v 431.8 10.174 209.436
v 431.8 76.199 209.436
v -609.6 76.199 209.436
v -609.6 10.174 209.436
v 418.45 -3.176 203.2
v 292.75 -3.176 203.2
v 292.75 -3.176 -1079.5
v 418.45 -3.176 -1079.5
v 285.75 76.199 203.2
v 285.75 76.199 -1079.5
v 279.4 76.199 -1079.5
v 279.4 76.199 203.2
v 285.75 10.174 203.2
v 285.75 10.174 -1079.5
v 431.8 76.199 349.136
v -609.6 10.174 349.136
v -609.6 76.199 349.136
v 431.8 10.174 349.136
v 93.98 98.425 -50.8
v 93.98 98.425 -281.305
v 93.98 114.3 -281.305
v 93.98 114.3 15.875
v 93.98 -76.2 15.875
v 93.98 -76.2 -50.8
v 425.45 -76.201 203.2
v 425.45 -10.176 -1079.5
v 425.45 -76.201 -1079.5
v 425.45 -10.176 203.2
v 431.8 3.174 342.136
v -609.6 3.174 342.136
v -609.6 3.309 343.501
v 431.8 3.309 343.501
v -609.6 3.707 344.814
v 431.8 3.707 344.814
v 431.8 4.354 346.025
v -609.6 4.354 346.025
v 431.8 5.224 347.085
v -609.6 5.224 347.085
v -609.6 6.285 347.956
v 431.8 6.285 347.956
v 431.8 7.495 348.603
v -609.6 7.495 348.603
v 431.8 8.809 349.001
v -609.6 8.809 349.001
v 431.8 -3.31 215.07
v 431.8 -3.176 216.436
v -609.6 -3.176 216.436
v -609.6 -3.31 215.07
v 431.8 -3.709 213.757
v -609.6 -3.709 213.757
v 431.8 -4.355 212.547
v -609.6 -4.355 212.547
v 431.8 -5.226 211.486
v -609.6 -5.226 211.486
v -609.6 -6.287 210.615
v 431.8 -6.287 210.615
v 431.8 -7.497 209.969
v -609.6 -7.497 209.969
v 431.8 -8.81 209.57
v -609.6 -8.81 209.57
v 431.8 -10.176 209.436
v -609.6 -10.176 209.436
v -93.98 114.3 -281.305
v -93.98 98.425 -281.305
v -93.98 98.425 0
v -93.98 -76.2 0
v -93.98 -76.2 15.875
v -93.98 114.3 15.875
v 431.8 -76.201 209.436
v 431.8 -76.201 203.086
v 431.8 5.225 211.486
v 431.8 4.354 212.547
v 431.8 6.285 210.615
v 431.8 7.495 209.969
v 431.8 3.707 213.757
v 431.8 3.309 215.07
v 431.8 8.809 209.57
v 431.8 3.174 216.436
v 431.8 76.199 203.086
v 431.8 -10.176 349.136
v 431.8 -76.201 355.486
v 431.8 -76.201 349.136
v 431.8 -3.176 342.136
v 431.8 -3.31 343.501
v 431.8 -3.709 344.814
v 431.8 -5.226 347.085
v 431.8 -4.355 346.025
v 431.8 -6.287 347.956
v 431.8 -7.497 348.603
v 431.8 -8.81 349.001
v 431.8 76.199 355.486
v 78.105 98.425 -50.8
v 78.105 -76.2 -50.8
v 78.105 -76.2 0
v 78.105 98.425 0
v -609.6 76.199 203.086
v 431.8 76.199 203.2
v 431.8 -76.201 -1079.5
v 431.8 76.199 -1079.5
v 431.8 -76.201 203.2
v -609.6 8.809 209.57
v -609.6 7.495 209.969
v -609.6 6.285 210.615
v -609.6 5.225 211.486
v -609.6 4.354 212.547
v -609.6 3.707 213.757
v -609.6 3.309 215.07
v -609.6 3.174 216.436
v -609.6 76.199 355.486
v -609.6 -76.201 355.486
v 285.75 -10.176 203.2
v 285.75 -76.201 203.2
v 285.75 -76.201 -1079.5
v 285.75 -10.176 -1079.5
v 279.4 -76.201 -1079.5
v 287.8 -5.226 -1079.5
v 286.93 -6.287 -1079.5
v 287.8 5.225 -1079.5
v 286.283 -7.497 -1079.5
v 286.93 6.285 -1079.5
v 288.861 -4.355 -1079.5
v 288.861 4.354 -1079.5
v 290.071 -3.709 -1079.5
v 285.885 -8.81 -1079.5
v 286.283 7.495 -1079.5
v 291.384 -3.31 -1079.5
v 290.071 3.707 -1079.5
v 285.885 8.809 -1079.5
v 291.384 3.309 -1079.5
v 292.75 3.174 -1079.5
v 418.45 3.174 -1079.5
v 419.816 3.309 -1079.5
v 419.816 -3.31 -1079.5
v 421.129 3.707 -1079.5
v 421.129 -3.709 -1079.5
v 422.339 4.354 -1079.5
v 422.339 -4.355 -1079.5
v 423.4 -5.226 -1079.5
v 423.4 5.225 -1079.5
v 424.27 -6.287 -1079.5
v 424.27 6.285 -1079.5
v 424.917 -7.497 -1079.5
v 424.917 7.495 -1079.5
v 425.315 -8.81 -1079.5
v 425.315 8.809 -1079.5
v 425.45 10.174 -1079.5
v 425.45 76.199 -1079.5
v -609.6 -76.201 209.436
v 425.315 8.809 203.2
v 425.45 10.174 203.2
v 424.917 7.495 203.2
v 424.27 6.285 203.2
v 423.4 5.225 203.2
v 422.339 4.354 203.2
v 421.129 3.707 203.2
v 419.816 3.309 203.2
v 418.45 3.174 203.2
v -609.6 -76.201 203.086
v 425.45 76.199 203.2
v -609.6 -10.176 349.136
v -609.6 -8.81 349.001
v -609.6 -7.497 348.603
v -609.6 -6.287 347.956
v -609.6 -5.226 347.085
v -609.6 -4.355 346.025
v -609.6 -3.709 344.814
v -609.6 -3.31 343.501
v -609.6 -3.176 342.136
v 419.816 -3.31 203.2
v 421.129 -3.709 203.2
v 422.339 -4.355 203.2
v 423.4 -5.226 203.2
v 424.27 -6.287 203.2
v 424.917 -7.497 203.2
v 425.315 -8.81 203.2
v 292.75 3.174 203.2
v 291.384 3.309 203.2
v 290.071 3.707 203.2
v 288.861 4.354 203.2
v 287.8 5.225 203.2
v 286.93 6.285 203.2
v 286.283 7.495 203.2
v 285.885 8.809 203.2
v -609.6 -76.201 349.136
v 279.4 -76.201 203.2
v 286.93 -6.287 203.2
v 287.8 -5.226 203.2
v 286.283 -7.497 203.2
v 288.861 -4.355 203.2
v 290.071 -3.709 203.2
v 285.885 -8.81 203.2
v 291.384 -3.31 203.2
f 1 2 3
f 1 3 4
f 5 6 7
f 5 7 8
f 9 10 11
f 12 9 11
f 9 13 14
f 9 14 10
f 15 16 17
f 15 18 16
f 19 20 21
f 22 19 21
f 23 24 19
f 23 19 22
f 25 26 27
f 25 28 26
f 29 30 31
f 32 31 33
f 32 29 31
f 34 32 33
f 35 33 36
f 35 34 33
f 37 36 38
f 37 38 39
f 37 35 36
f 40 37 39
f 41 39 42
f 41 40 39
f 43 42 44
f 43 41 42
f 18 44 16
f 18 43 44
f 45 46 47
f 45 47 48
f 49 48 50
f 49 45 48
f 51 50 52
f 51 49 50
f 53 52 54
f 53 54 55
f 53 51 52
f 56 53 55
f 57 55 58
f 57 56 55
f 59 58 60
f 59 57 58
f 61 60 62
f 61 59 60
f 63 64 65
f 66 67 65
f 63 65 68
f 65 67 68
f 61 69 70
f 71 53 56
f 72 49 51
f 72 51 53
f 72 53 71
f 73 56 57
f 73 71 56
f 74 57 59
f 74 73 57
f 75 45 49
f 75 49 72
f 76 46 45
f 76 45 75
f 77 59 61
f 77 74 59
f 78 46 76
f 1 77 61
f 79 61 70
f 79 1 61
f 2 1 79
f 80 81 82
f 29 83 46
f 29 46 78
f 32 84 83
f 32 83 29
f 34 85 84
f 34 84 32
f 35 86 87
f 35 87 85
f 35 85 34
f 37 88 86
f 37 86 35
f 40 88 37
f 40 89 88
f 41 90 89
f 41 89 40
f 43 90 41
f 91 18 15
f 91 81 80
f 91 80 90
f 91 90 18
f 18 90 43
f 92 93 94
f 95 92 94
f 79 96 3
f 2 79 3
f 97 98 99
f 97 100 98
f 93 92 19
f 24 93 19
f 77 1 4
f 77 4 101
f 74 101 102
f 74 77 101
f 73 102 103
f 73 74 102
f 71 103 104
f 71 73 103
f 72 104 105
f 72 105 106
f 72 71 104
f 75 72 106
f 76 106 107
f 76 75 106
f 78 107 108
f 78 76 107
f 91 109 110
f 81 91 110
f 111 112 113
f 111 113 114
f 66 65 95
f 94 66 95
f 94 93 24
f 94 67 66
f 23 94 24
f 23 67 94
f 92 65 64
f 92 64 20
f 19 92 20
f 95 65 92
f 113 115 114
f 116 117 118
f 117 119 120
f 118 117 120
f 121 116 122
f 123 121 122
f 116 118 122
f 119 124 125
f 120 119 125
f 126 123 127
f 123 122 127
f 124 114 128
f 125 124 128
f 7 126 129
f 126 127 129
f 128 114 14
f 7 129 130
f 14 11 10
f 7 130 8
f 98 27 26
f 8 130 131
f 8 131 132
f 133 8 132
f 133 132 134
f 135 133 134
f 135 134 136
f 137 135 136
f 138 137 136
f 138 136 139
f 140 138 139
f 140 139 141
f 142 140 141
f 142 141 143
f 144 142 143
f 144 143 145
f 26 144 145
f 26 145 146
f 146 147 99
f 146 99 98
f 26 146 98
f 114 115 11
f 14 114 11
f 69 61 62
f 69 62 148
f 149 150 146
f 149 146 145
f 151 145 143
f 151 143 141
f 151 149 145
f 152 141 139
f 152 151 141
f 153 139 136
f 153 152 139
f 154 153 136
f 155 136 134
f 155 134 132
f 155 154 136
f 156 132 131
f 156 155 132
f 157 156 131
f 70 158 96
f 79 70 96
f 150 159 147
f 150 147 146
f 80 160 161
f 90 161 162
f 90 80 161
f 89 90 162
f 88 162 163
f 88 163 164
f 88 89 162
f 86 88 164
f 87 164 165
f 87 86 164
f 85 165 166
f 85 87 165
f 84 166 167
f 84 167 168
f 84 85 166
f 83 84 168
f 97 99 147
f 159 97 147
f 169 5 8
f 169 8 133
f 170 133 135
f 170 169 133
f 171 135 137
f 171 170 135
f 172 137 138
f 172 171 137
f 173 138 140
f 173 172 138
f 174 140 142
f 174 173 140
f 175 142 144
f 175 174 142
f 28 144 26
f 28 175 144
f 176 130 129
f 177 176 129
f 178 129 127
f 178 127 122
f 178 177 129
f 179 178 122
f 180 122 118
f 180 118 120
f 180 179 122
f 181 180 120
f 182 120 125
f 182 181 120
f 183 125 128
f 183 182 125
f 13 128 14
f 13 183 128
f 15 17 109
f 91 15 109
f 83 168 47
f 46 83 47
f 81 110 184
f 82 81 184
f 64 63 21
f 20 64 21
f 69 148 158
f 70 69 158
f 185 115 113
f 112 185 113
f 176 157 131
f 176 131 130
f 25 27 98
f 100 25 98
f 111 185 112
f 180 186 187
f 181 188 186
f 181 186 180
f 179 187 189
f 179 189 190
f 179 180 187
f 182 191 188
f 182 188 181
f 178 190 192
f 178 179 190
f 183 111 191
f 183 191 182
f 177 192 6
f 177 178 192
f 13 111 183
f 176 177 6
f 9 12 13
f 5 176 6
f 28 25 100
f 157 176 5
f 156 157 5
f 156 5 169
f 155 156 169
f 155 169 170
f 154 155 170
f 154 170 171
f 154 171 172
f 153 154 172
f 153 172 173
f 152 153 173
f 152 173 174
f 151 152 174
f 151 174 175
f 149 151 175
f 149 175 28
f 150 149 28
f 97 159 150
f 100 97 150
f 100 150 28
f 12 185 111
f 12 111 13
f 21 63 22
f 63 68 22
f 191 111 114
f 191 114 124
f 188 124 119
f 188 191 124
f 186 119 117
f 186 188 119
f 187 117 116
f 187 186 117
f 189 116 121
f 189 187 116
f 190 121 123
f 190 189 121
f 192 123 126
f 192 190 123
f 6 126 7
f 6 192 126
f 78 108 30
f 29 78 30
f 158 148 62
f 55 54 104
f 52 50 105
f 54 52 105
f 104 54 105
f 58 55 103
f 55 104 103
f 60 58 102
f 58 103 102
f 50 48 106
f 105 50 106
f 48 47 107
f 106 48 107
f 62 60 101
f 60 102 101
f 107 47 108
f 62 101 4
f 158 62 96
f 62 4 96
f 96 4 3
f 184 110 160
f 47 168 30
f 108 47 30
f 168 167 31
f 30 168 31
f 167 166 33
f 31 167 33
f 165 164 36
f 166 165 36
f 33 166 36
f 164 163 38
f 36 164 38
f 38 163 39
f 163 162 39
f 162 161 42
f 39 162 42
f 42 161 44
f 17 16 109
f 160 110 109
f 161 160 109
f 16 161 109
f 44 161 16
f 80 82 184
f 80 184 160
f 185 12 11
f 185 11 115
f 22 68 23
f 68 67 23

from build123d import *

# Parameters (mm, degrees)
F1_DEPTH      = 431.8
F1_DEPTH_BACK = 609.6
F3_DEPTH      = 203.2
F3_DEPTH_BACK = 1079.5
F4_W          = 187.96
F4_H          = 15.875
F5_DEPTH      = 76.2
F5_DEPTH_BACK = 114.3
F6_W          = 187.96
F6_H          = 15.875
F7_DEPTH      = 281.305
F8_W          = 15.875
F8_H          = 50.8
F9_DEPTH      = 76.2
F9_DEPTH_BACK = 98.425


with BuildPart() as f1:
    # F0 (on Right) → F1 (new body, two sides)
    with BuildSketch(Plane.YZ) as f1_sk:
        with BuildLine():
            Line((76.199248, 355.485669), (-76.200752, 355.485669))
            Line((-76.200752, 355.485669), (-76.200752, 349.135669))
            Line((-76.200752, 349.135669), (-10.175752, 349.135669))
            ThreePointArc((-10.175752, 349.135669), (-5.226005, 347.085417), (-3.175752, 342.135669))
            Line((-3.175752, 342.135669), (-3.175752, 216.435669))
            ThreePointArc((-3.175752, 216.435669), (-5.226005, 211.485922), (-10.175752, 209.435669))
            Line((-10.175752, 209.435669), (-76.200752, 209.435669))
            Line((-76.200752, 209.435669), (-76.200752, 203.085669))
            Line((-76.200752, 203.085669), (76.199248, 203.085669))
            Line((76.199248, 203.085669), (76.199248, 209.435669))
            Line((76.199248, 209.435669), (10.174248, 209.435669))
            ThreePointArc((10.174248, 209.435669), (5.2245, 211.485922), (3.174248, 216.435669))
            Line((3.174248, 216.435669), (3.174248, 342.135669))
            ThreePointArc((3.174248, 342.135669), (5.2245, 347.085417), (10.174248, 349.135669))
            Line((10.174248, 349.135669), (76.199248, 349.135669))
            Line((76.199248, 349.135669), (76.199248, 355.485669))
        make_face()
    extrude(amount=F1_DEPTH)
    extrude(f1_sk.sketch, amount=-F1_DEPTH_BACK)


with BuildPart() as f3:
    # F2 (on Top) → F3 (new body, two sides)
    with BuildSketch(Plane.XY) as f3_sk:
        with BuildLine():
            Line((431.8, -76.200752), (431.8, 76.199248))
            Line((431.8, 76.199248), (425.45, 76.199248))
            Line((425.45, 76.199248), (425.45, 10.174248))
            ThreePointArc((425.45, 10.174248), (423.399747, 5.2245), (418.45, 3.174248))
            Line((418.45, 3.174248), (292.75, 3.174248))
            ThreePointArc((292.75, 3.174248), (287.800253, 5.2245), (285.75, 10.174248))
            Line((285.75, 10.174248), (285.75, 76.199248))
            Line((285.75, 76.199248), (279.4, 76.199248))
            Line((279.4, 76.199248), (279.4, -76.200752))
            Line((279.4, -76.200752), (285.75, -76.200752))
            Line((285.75, -76.200752), (285.75, -10.175752))
            ThreePointArc((285.75, -10.175752), (287.800253, -5.226005), (292.75, -3.175752))
            Line((292.75, -3.175752), (418.45, -3.175752))
            ThreePointArc((418.45, -3.175752), (423.399747, -5.226005), (425.45, -10.175752))
            Line((425.45, -10.175752), (425.45, -76.200752))
            Line((425.45, -76.200752), (431.8, -76.200752))
        make_face()
    extrude(amount=F3_DEPTH)
    extrude(f3_sk.sketch, amount=-F3_DEPTH_BACK)


with BuildPart() as f5:
    # F4 (on Front) → F5 (new body, two sides)
    with BuildSketch(Plane.XZ) as f5_sk:
        with Locations((0, 7.9375)):
            Rectangle(F4_W, F4_H)
    extrude(amount=F5_DEPTH)
    extrude(f5_sk.sketch, amount=-F5_DEPTH_BACK)

    # F6 (on Top) → F7 (join)
    with BuildSketch(Plane.XY):
        with Locations((0, 106.3625)):
            Rectangle(F6_W, F6_H)
    extrude(amount=-F7_DEPTH)

    # F8 (on Front) → F9 (join, two sides)
    with BuildSketch(Plane.XZ) as f9_sk:
        with Locations((86.0425, -25.4)):
            Rectangle(F8_W, F8_H)
    extrude(amount=F9_DEPTH)
    extrude(f9_sk.sketch, amount=-F9_DEPTH_BACK)


solid = Compound([f1.part, f3.part, f5.part])
